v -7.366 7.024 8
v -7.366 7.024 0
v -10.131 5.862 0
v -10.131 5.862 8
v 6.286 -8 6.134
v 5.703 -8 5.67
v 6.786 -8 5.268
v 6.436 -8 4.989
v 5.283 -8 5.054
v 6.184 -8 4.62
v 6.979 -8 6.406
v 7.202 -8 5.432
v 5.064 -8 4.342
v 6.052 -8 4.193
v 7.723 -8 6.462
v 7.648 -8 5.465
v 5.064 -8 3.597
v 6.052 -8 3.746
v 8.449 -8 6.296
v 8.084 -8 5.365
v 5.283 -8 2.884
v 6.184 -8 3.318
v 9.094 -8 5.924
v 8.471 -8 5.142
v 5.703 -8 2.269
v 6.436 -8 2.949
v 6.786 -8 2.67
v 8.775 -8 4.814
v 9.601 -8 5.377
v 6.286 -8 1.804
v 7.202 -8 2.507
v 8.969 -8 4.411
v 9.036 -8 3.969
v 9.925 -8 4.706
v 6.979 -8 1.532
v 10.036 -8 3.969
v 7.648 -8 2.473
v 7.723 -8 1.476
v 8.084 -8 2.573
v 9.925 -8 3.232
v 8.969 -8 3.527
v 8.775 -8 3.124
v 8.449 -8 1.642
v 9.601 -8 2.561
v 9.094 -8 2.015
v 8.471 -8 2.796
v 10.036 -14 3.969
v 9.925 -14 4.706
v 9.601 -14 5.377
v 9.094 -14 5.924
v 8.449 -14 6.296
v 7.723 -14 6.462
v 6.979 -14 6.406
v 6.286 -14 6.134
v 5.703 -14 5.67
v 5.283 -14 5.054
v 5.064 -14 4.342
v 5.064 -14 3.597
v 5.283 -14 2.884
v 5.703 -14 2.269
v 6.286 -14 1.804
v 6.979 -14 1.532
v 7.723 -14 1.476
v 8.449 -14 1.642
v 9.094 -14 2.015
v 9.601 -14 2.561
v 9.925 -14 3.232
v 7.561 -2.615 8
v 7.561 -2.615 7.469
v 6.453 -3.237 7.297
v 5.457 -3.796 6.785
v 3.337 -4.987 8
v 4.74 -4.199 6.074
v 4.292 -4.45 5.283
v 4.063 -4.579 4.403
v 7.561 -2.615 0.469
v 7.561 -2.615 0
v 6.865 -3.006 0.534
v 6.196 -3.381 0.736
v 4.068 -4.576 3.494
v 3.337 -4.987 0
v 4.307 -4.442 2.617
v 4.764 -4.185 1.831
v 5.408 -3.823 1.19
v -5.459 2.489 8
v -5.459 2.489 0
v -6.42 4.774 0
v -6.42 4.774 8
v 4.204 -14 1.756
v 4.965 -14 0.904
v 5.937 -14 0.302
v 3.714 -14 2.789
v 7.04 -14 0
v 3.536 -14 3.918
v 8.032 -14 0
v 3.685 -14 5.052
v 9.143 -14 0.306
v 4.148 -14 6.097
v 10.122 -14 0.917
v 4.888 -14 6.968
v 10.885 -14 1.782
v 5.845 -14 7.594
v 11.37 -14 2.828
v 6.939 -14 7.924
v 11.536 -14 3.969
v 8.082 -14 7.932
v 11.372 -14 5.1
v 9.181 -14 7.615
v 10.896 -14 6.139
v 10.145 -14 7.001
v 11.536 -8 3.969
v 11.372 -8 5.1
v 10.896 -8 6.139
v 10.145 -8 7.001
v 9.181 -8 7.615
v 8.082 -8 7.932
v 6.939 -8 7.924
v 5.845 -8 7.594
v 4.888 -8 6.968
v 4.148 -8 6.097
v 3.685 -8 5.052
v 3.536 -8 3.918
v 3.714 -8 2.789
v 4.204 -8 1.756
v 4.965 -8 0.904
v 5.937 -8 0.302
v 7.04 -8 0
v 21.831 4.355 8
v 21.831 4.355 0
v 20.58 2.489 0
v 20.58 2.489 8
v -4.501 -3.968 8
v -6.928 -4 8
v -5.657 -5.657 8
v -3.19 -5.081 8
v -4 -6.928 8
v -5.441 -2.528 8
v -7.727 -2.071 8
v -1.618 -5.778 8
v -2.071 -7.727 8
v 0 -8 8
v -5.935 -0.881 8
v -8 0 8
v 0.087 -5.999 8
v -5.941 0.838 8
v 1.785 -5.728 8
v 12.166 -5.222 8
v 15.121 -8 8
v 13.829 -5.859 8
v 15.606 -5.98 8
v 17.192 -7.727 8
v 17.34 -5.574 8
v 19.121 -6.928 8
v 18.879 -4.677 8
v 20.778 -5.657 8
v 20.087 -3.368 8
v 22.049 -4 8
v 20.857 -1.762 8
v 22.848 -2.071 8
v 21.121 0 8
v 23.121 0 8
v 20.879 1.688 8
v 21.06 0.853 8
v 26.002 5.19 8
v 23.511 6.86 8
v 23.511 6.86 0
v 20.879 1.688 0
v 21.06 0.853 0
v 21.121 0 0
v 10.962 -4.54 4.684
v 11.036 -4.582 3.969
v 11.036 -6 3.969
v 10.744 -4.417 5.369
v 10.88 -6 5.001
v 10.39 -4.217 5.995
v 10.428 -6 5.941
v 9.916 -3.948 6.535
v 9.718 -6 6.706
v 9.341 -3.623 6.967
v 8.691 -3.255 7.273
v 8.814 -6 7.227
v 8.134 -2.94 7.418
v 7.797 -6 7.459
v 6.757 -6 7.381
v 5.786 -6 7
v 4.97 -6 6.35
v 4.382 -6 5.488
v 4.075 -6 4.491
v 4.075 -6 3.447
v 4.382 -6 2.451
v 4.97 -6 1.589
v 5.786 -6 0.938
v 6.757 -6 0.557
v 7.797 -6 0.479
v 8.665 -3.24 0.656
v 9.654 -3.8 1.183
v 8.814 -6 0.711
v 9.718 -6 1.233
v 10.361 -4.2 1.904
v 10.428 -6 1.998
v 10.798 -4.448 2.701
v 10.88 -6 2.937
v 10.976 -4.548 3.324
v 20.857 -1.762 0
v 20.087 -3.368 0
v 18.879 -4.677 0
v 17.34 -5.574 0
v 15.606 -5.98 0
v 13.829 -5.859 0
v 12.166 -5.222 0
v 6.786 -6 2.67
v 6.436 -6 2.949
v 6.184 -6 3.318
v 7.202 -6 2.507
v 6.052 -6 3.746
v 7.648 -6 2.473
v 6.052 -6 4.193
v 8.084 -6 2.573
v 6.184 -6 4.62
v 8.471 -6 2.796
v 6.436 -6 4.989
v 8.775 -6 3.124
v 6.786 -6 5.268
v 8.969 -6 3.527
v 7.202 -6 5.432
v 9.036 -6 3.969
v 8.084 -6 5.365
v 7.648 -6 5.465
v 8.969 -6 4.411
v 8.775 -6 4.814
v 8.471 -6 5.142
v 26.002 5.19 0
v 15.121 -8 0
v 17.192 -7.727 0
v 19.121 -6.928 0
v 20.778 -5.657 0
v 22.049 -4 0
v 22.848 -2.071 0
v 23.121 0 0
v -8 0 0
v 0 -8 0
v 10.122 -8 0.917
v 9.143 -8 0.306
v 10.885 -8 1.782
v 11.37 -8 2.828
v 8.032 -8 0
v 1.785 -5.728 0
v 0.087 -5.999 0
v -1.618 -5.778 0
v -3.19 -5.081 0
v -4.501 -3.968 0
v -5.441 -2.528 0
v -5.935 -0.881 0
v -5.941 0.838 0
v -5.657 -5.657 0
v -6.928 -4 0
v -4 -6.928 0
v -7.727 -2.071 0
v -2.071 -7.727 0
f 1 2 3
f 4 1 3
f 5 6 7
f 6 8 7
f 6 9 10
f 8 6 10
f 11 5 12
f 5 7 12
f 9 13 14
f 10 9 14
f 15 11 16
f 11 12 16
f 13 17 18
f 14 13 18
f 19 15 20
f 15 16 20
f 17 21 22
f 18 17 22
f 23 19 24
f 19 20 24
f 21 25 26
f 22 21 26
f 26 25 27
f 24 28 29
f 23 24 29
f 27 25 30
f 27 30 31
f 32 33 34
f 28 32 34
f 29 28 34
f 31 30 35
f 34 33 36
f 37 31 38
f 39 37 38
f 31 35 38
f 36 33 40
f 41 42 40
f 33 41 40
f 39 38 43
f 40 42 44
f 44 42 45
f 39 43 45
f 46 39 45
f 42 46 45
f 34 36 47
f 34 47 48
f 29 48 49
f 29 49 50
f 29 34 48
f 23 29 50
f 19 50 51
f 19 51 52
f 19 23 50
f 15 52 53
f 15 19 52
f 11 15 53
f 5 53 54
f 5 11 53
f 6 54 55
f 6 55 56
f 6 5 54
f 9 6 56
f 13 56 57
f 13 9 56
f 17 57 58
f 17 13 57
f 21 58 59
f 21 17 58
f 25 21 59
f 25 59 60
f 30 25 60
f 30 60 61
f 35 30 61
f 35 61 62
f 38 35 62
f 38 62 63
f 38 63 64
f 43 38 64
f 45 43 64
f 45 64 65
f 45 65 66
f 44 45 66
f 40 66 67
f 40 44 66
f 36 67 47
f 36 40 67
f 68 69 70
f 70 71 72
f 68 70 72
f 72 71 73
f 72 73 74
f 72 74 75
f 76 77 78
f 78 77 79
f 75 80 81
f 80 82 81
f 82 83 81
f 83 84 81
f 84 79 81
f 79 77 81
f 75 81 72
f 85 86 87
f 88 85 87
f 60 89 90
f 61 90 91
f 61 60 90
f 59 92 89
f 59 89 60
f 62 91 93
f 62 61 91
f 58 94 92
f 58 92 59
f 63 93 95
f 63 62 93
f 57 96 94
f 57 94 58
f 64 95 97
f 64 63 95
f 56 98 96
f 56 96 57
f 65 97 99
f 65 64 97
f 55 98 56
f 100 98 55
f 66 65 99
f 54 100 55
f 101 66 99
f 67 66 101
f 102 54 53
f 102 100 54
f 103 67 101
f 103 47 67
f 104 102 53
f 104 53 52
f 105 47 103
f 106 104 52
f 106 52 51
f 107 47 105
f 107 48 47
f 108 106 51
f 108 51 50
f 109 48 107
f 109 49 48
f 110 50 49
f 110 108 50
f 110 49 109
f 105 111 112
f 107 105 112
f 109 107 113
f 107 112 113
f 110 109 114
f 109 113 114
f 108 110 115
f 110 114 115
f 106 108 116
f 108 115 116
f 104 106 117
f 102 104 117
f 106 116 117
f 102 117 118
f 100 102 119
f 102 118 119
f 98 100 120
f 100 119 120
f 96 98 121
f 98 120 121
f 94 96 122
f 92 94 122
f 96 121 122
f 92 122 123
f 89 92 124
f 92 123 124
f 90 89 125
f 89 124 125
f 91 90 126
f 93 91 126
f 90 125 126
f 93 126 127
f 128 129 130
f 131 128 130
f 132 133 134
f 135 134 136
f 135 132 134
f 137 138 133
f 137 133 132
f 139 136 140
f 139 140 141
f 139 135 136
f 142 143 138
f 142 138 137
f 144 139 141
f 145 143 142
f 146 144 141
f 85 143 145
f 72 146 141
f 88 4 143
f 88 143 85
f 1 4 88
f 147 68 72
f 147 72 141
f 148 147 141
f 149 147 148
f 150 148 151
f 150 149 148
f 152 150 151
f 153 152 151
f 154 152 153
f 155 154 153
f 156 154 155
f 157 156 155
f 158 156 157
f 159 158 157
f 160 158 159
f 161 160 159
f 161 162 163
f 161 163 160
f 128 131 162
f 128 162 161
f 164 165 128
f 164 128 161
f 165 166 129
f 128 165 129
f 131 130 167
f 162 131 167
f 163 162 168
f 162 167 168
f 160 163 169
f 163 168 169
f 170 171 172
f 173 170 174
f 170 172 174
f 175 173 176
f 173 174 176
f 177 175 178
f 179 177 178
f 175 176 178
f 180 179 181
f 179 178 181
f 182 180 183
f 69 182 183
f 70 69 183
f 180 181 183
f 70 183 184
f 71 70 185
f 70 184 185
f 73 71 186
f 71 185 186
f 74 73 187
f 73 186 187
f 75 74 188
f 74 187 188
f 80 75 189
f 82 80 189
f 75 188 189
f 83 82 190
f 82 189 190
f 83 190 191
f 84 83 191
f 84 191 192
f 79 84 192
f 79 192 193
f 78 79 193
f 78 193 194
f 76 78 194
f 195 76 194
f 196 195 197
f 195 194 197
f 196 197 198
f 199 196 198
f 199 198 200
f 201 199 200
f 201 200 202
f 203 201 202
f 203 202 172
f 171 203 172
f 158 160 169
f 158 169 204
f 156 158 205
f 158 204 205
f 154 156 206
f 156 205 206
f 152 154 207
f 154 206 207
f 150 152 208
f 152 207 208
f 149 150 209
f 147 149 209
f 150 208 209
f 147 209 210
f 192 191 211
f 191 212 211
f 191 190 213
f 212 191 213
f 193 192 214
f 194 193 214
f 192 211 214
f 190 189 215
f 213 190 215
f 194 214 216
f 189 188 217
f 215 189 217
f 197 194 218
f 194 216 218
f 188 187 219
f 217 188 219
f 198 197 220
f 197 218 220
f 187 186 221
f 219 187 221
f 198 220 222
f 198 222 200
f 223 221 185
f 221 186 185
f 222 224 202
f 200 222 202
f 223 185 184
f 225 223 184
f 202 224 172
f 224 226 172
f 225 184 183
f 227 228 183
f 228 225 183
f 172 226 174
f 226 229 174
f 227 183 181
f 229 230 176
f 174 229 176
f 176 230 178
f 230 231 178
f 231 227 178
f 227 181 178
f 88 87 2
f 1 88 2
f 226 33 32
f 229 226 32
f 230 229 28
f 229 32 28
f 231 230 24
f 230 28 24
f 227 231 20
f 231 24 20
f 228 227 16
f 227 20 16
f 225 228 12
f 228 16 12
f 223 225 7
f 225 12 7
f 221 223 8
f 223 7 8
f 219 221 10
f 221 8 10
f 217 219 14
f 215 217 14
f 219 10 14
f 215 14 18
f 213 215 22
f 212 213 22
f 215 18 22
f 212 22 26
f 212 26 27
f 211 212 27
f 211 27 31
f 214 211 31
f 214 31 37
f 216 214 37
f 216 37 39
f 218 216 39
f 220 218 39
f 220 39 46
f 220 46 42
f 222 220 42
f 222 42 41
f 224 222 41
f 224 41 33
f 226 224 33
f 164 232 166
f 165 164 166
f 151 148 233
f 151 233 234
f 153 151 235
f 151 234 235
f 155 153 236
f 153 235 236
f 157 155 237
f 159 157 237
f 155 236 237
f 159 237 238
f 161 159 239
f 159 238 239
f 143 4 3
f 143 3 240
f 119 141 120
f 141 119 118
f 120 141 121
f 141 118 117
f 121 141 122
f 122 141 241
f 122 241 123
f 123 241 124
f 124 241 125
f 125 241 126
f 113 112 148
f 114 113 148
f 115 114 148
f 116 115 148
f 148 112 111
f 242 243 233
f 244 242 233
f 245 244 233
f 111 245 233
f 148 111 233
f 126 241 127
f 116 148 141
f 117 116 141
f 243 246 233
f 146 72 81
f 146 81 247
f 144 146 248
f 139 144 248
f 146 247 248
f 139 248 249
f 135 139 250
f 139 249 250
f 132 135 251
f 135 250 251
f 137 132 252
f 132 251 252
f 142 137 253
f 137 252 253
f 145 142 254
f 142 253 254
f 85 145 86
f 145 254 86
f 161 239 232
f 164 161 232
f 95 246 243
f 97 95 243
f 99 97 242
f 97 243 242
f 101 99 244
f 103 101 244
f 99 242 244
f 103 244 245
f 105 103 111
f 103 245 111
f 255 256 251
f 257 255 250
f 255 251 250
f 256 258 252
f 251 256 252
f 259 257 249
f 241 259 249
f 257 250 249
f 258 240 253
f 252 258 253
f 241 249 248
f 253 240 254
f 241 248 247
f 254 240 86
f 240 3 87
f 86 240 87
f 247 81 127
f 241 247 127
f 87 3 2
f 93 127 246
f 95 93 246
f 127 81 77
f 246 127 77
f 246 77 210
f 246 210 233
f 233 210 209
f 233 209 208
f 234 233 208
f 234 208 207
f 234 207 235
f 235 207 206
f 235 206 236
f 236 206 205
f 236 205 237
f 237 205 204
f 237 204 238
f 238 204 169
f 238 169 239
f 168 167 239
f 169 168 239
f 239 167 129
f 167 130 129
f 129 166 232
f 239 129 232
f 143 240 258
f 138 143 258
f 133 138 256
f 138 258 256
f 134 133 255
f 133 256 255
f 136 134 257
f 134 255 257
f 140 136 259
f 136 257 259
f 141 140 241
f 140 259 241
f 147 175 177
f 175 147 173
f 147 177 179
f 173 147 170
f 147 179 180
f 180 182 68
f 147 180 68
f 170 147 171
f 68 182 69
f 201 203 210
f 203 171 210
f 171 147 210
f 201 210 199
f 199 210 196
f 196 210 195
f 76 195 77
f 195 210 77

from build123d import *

# Parameters (mm, degrees)
F1_DEPTH = 8
F2_R     = 1.5
F3_DEPTH = 25
F2_R_2   = 2.5
F4_DEPTH = 6
F6_START = -2
F5_R     = 3.5
F6_DEPTH = 23


with BuildPart() as f1:
    # F0 (on Top) → F1 (new body)
    with BuildSketch(Plane.XY):
        with BuildLine():
            ThreePointArc((-6.4197371813, 4.7735704167), (-7.5946658073, 2.5141700966), (-8, 0))
            ThreePointArc((-8, 0), (-5.6568542495, -5.6568542495), (0, -8))
            ThreePointArc((0, -8), (4.6410709926, -6.5161691231), (7.5605008751, -2.6151150104))
            Line((7.5605008751, -2.6151150104), (3.3365949124, -4.9866957387))
            ThreePointArc((3.3365949124, -4.9866957387), (-3.8856695712, -4.5718237044), (-5.4593337085, 2.4891113795))
            Line((-5.4593337085, 2.4891113795), (-6.4197371813, 4.7735704167))
        make_face()
        with BuildLine():
            ThreePointArc((7.5605008751, -2.6151150104), (4.6410709926, -6.5161691231), (0, -8))
            Line((0, -8), (15.1210017502, -8))
            ThreePointArc((15.1210017502, -8), (10.4799307576, -6.5161691231), (7.5605008751, -2.6151150104))
        make_face()
        with BuildLine():
            Line((12.1655220018, -5.2216031501), (7.5605008751, -2.6151150104))
            ThreePointArc((7.5605008751, -2.6151150104), (10.4799307576, -6.5161691231), (15.1210017502, -8))
            ThreePointArc((15.1210017502, -8), (20.7778559997, -5.6568542495), (23.1210017502, 0))
            ThreePointArc((23.1210017502, 0), (22.79183999, 2.2711760607), (21.8314415756, 4.3554560439))
            Line((21.8314415756, 4.3554560439), (20.5803354587, 2.4891113795))
            ThreePointArc((20.5803354587, 2.4891113795), (20.9842773813, 1.2735771962), (21.1210017502, 0))
            ThreePointArc((21.1210017502, 0), (18.1431798977, -5.1832846001), (12.1655220018, -5.2216031501))
        make_face()
        with BuildLine():
            ThreePointArc((21.8314415756, 4.3554560439), (22.79183999, 2.2711760607), (23.1210017502, 0))
            Line((23.1210017502, 0), (26.0024620047, 5.1898341576))
            Line((26.0024620047, 5.1898341576), (23.510556668, 6.8602855317))
            Line((23.510556668, 6.8602855317), (21.8314415756, 4.3554560439))
        make_face()
        with BuildLine():
            Line((-10.1314789225, 5.8615841737), (-8, 0))
            ThreePointArc((-8, 0), (-7.5946658073, 2.5141700966), (-6.4197371813, 4.7735704167))
            Line((-6.4197371813, 4.7735704167), (-7.3659350164, 7.0242392831))
            Line((-7.3659350164, 7.0242392831), (-10.1314789225, 5.8615841737))
        make_face()
    extrude(amount=F1_DEPTH)

    # F2 (on face) → F3 (cut)
    with BuildSketch(Plane.XZ.offset(8)):
        with Locations((7.5357314199, 3.9691259153)):
            Circle(F2_R)
    extrude(amount=-F3_DEPTH, mode=Mode.SUBTRACT)

    # F2 (on face) → F4 (join)
    with BuildSketch(Plane.XZ.offset(8)):
        with BuildLine():
            ThreePointArc((8.031755077, 0), (10.5344056793, 1.3218721145), (11.5357314199, 3.9691259153))
            ThreePointArc((11.5357314199, 3.9691259153), (4.8884776191, 6.9678001747), (7.0397077629, 0))
            Line((7.0397077629, 0), (8.031755077, 0))
        make_face()
        with Locations((7.5357314199, 3.9691259153)):
            Circle(F2_R_2, mode=Mode.SUBTRACT)
    extrude(amount=F4_DEPTH)

    # F5 (on face) → F6 (cut)
    with BuildSketch(Plane.XZ.offset(8).offset(F6_START)):
        with Locations((7.5357314199, 3.9691259153)):
            Circle(F5_R)
    extrude(amount=-F6_DEPTH, mode=Mode.SUBTRACT)


solid = f1.part
